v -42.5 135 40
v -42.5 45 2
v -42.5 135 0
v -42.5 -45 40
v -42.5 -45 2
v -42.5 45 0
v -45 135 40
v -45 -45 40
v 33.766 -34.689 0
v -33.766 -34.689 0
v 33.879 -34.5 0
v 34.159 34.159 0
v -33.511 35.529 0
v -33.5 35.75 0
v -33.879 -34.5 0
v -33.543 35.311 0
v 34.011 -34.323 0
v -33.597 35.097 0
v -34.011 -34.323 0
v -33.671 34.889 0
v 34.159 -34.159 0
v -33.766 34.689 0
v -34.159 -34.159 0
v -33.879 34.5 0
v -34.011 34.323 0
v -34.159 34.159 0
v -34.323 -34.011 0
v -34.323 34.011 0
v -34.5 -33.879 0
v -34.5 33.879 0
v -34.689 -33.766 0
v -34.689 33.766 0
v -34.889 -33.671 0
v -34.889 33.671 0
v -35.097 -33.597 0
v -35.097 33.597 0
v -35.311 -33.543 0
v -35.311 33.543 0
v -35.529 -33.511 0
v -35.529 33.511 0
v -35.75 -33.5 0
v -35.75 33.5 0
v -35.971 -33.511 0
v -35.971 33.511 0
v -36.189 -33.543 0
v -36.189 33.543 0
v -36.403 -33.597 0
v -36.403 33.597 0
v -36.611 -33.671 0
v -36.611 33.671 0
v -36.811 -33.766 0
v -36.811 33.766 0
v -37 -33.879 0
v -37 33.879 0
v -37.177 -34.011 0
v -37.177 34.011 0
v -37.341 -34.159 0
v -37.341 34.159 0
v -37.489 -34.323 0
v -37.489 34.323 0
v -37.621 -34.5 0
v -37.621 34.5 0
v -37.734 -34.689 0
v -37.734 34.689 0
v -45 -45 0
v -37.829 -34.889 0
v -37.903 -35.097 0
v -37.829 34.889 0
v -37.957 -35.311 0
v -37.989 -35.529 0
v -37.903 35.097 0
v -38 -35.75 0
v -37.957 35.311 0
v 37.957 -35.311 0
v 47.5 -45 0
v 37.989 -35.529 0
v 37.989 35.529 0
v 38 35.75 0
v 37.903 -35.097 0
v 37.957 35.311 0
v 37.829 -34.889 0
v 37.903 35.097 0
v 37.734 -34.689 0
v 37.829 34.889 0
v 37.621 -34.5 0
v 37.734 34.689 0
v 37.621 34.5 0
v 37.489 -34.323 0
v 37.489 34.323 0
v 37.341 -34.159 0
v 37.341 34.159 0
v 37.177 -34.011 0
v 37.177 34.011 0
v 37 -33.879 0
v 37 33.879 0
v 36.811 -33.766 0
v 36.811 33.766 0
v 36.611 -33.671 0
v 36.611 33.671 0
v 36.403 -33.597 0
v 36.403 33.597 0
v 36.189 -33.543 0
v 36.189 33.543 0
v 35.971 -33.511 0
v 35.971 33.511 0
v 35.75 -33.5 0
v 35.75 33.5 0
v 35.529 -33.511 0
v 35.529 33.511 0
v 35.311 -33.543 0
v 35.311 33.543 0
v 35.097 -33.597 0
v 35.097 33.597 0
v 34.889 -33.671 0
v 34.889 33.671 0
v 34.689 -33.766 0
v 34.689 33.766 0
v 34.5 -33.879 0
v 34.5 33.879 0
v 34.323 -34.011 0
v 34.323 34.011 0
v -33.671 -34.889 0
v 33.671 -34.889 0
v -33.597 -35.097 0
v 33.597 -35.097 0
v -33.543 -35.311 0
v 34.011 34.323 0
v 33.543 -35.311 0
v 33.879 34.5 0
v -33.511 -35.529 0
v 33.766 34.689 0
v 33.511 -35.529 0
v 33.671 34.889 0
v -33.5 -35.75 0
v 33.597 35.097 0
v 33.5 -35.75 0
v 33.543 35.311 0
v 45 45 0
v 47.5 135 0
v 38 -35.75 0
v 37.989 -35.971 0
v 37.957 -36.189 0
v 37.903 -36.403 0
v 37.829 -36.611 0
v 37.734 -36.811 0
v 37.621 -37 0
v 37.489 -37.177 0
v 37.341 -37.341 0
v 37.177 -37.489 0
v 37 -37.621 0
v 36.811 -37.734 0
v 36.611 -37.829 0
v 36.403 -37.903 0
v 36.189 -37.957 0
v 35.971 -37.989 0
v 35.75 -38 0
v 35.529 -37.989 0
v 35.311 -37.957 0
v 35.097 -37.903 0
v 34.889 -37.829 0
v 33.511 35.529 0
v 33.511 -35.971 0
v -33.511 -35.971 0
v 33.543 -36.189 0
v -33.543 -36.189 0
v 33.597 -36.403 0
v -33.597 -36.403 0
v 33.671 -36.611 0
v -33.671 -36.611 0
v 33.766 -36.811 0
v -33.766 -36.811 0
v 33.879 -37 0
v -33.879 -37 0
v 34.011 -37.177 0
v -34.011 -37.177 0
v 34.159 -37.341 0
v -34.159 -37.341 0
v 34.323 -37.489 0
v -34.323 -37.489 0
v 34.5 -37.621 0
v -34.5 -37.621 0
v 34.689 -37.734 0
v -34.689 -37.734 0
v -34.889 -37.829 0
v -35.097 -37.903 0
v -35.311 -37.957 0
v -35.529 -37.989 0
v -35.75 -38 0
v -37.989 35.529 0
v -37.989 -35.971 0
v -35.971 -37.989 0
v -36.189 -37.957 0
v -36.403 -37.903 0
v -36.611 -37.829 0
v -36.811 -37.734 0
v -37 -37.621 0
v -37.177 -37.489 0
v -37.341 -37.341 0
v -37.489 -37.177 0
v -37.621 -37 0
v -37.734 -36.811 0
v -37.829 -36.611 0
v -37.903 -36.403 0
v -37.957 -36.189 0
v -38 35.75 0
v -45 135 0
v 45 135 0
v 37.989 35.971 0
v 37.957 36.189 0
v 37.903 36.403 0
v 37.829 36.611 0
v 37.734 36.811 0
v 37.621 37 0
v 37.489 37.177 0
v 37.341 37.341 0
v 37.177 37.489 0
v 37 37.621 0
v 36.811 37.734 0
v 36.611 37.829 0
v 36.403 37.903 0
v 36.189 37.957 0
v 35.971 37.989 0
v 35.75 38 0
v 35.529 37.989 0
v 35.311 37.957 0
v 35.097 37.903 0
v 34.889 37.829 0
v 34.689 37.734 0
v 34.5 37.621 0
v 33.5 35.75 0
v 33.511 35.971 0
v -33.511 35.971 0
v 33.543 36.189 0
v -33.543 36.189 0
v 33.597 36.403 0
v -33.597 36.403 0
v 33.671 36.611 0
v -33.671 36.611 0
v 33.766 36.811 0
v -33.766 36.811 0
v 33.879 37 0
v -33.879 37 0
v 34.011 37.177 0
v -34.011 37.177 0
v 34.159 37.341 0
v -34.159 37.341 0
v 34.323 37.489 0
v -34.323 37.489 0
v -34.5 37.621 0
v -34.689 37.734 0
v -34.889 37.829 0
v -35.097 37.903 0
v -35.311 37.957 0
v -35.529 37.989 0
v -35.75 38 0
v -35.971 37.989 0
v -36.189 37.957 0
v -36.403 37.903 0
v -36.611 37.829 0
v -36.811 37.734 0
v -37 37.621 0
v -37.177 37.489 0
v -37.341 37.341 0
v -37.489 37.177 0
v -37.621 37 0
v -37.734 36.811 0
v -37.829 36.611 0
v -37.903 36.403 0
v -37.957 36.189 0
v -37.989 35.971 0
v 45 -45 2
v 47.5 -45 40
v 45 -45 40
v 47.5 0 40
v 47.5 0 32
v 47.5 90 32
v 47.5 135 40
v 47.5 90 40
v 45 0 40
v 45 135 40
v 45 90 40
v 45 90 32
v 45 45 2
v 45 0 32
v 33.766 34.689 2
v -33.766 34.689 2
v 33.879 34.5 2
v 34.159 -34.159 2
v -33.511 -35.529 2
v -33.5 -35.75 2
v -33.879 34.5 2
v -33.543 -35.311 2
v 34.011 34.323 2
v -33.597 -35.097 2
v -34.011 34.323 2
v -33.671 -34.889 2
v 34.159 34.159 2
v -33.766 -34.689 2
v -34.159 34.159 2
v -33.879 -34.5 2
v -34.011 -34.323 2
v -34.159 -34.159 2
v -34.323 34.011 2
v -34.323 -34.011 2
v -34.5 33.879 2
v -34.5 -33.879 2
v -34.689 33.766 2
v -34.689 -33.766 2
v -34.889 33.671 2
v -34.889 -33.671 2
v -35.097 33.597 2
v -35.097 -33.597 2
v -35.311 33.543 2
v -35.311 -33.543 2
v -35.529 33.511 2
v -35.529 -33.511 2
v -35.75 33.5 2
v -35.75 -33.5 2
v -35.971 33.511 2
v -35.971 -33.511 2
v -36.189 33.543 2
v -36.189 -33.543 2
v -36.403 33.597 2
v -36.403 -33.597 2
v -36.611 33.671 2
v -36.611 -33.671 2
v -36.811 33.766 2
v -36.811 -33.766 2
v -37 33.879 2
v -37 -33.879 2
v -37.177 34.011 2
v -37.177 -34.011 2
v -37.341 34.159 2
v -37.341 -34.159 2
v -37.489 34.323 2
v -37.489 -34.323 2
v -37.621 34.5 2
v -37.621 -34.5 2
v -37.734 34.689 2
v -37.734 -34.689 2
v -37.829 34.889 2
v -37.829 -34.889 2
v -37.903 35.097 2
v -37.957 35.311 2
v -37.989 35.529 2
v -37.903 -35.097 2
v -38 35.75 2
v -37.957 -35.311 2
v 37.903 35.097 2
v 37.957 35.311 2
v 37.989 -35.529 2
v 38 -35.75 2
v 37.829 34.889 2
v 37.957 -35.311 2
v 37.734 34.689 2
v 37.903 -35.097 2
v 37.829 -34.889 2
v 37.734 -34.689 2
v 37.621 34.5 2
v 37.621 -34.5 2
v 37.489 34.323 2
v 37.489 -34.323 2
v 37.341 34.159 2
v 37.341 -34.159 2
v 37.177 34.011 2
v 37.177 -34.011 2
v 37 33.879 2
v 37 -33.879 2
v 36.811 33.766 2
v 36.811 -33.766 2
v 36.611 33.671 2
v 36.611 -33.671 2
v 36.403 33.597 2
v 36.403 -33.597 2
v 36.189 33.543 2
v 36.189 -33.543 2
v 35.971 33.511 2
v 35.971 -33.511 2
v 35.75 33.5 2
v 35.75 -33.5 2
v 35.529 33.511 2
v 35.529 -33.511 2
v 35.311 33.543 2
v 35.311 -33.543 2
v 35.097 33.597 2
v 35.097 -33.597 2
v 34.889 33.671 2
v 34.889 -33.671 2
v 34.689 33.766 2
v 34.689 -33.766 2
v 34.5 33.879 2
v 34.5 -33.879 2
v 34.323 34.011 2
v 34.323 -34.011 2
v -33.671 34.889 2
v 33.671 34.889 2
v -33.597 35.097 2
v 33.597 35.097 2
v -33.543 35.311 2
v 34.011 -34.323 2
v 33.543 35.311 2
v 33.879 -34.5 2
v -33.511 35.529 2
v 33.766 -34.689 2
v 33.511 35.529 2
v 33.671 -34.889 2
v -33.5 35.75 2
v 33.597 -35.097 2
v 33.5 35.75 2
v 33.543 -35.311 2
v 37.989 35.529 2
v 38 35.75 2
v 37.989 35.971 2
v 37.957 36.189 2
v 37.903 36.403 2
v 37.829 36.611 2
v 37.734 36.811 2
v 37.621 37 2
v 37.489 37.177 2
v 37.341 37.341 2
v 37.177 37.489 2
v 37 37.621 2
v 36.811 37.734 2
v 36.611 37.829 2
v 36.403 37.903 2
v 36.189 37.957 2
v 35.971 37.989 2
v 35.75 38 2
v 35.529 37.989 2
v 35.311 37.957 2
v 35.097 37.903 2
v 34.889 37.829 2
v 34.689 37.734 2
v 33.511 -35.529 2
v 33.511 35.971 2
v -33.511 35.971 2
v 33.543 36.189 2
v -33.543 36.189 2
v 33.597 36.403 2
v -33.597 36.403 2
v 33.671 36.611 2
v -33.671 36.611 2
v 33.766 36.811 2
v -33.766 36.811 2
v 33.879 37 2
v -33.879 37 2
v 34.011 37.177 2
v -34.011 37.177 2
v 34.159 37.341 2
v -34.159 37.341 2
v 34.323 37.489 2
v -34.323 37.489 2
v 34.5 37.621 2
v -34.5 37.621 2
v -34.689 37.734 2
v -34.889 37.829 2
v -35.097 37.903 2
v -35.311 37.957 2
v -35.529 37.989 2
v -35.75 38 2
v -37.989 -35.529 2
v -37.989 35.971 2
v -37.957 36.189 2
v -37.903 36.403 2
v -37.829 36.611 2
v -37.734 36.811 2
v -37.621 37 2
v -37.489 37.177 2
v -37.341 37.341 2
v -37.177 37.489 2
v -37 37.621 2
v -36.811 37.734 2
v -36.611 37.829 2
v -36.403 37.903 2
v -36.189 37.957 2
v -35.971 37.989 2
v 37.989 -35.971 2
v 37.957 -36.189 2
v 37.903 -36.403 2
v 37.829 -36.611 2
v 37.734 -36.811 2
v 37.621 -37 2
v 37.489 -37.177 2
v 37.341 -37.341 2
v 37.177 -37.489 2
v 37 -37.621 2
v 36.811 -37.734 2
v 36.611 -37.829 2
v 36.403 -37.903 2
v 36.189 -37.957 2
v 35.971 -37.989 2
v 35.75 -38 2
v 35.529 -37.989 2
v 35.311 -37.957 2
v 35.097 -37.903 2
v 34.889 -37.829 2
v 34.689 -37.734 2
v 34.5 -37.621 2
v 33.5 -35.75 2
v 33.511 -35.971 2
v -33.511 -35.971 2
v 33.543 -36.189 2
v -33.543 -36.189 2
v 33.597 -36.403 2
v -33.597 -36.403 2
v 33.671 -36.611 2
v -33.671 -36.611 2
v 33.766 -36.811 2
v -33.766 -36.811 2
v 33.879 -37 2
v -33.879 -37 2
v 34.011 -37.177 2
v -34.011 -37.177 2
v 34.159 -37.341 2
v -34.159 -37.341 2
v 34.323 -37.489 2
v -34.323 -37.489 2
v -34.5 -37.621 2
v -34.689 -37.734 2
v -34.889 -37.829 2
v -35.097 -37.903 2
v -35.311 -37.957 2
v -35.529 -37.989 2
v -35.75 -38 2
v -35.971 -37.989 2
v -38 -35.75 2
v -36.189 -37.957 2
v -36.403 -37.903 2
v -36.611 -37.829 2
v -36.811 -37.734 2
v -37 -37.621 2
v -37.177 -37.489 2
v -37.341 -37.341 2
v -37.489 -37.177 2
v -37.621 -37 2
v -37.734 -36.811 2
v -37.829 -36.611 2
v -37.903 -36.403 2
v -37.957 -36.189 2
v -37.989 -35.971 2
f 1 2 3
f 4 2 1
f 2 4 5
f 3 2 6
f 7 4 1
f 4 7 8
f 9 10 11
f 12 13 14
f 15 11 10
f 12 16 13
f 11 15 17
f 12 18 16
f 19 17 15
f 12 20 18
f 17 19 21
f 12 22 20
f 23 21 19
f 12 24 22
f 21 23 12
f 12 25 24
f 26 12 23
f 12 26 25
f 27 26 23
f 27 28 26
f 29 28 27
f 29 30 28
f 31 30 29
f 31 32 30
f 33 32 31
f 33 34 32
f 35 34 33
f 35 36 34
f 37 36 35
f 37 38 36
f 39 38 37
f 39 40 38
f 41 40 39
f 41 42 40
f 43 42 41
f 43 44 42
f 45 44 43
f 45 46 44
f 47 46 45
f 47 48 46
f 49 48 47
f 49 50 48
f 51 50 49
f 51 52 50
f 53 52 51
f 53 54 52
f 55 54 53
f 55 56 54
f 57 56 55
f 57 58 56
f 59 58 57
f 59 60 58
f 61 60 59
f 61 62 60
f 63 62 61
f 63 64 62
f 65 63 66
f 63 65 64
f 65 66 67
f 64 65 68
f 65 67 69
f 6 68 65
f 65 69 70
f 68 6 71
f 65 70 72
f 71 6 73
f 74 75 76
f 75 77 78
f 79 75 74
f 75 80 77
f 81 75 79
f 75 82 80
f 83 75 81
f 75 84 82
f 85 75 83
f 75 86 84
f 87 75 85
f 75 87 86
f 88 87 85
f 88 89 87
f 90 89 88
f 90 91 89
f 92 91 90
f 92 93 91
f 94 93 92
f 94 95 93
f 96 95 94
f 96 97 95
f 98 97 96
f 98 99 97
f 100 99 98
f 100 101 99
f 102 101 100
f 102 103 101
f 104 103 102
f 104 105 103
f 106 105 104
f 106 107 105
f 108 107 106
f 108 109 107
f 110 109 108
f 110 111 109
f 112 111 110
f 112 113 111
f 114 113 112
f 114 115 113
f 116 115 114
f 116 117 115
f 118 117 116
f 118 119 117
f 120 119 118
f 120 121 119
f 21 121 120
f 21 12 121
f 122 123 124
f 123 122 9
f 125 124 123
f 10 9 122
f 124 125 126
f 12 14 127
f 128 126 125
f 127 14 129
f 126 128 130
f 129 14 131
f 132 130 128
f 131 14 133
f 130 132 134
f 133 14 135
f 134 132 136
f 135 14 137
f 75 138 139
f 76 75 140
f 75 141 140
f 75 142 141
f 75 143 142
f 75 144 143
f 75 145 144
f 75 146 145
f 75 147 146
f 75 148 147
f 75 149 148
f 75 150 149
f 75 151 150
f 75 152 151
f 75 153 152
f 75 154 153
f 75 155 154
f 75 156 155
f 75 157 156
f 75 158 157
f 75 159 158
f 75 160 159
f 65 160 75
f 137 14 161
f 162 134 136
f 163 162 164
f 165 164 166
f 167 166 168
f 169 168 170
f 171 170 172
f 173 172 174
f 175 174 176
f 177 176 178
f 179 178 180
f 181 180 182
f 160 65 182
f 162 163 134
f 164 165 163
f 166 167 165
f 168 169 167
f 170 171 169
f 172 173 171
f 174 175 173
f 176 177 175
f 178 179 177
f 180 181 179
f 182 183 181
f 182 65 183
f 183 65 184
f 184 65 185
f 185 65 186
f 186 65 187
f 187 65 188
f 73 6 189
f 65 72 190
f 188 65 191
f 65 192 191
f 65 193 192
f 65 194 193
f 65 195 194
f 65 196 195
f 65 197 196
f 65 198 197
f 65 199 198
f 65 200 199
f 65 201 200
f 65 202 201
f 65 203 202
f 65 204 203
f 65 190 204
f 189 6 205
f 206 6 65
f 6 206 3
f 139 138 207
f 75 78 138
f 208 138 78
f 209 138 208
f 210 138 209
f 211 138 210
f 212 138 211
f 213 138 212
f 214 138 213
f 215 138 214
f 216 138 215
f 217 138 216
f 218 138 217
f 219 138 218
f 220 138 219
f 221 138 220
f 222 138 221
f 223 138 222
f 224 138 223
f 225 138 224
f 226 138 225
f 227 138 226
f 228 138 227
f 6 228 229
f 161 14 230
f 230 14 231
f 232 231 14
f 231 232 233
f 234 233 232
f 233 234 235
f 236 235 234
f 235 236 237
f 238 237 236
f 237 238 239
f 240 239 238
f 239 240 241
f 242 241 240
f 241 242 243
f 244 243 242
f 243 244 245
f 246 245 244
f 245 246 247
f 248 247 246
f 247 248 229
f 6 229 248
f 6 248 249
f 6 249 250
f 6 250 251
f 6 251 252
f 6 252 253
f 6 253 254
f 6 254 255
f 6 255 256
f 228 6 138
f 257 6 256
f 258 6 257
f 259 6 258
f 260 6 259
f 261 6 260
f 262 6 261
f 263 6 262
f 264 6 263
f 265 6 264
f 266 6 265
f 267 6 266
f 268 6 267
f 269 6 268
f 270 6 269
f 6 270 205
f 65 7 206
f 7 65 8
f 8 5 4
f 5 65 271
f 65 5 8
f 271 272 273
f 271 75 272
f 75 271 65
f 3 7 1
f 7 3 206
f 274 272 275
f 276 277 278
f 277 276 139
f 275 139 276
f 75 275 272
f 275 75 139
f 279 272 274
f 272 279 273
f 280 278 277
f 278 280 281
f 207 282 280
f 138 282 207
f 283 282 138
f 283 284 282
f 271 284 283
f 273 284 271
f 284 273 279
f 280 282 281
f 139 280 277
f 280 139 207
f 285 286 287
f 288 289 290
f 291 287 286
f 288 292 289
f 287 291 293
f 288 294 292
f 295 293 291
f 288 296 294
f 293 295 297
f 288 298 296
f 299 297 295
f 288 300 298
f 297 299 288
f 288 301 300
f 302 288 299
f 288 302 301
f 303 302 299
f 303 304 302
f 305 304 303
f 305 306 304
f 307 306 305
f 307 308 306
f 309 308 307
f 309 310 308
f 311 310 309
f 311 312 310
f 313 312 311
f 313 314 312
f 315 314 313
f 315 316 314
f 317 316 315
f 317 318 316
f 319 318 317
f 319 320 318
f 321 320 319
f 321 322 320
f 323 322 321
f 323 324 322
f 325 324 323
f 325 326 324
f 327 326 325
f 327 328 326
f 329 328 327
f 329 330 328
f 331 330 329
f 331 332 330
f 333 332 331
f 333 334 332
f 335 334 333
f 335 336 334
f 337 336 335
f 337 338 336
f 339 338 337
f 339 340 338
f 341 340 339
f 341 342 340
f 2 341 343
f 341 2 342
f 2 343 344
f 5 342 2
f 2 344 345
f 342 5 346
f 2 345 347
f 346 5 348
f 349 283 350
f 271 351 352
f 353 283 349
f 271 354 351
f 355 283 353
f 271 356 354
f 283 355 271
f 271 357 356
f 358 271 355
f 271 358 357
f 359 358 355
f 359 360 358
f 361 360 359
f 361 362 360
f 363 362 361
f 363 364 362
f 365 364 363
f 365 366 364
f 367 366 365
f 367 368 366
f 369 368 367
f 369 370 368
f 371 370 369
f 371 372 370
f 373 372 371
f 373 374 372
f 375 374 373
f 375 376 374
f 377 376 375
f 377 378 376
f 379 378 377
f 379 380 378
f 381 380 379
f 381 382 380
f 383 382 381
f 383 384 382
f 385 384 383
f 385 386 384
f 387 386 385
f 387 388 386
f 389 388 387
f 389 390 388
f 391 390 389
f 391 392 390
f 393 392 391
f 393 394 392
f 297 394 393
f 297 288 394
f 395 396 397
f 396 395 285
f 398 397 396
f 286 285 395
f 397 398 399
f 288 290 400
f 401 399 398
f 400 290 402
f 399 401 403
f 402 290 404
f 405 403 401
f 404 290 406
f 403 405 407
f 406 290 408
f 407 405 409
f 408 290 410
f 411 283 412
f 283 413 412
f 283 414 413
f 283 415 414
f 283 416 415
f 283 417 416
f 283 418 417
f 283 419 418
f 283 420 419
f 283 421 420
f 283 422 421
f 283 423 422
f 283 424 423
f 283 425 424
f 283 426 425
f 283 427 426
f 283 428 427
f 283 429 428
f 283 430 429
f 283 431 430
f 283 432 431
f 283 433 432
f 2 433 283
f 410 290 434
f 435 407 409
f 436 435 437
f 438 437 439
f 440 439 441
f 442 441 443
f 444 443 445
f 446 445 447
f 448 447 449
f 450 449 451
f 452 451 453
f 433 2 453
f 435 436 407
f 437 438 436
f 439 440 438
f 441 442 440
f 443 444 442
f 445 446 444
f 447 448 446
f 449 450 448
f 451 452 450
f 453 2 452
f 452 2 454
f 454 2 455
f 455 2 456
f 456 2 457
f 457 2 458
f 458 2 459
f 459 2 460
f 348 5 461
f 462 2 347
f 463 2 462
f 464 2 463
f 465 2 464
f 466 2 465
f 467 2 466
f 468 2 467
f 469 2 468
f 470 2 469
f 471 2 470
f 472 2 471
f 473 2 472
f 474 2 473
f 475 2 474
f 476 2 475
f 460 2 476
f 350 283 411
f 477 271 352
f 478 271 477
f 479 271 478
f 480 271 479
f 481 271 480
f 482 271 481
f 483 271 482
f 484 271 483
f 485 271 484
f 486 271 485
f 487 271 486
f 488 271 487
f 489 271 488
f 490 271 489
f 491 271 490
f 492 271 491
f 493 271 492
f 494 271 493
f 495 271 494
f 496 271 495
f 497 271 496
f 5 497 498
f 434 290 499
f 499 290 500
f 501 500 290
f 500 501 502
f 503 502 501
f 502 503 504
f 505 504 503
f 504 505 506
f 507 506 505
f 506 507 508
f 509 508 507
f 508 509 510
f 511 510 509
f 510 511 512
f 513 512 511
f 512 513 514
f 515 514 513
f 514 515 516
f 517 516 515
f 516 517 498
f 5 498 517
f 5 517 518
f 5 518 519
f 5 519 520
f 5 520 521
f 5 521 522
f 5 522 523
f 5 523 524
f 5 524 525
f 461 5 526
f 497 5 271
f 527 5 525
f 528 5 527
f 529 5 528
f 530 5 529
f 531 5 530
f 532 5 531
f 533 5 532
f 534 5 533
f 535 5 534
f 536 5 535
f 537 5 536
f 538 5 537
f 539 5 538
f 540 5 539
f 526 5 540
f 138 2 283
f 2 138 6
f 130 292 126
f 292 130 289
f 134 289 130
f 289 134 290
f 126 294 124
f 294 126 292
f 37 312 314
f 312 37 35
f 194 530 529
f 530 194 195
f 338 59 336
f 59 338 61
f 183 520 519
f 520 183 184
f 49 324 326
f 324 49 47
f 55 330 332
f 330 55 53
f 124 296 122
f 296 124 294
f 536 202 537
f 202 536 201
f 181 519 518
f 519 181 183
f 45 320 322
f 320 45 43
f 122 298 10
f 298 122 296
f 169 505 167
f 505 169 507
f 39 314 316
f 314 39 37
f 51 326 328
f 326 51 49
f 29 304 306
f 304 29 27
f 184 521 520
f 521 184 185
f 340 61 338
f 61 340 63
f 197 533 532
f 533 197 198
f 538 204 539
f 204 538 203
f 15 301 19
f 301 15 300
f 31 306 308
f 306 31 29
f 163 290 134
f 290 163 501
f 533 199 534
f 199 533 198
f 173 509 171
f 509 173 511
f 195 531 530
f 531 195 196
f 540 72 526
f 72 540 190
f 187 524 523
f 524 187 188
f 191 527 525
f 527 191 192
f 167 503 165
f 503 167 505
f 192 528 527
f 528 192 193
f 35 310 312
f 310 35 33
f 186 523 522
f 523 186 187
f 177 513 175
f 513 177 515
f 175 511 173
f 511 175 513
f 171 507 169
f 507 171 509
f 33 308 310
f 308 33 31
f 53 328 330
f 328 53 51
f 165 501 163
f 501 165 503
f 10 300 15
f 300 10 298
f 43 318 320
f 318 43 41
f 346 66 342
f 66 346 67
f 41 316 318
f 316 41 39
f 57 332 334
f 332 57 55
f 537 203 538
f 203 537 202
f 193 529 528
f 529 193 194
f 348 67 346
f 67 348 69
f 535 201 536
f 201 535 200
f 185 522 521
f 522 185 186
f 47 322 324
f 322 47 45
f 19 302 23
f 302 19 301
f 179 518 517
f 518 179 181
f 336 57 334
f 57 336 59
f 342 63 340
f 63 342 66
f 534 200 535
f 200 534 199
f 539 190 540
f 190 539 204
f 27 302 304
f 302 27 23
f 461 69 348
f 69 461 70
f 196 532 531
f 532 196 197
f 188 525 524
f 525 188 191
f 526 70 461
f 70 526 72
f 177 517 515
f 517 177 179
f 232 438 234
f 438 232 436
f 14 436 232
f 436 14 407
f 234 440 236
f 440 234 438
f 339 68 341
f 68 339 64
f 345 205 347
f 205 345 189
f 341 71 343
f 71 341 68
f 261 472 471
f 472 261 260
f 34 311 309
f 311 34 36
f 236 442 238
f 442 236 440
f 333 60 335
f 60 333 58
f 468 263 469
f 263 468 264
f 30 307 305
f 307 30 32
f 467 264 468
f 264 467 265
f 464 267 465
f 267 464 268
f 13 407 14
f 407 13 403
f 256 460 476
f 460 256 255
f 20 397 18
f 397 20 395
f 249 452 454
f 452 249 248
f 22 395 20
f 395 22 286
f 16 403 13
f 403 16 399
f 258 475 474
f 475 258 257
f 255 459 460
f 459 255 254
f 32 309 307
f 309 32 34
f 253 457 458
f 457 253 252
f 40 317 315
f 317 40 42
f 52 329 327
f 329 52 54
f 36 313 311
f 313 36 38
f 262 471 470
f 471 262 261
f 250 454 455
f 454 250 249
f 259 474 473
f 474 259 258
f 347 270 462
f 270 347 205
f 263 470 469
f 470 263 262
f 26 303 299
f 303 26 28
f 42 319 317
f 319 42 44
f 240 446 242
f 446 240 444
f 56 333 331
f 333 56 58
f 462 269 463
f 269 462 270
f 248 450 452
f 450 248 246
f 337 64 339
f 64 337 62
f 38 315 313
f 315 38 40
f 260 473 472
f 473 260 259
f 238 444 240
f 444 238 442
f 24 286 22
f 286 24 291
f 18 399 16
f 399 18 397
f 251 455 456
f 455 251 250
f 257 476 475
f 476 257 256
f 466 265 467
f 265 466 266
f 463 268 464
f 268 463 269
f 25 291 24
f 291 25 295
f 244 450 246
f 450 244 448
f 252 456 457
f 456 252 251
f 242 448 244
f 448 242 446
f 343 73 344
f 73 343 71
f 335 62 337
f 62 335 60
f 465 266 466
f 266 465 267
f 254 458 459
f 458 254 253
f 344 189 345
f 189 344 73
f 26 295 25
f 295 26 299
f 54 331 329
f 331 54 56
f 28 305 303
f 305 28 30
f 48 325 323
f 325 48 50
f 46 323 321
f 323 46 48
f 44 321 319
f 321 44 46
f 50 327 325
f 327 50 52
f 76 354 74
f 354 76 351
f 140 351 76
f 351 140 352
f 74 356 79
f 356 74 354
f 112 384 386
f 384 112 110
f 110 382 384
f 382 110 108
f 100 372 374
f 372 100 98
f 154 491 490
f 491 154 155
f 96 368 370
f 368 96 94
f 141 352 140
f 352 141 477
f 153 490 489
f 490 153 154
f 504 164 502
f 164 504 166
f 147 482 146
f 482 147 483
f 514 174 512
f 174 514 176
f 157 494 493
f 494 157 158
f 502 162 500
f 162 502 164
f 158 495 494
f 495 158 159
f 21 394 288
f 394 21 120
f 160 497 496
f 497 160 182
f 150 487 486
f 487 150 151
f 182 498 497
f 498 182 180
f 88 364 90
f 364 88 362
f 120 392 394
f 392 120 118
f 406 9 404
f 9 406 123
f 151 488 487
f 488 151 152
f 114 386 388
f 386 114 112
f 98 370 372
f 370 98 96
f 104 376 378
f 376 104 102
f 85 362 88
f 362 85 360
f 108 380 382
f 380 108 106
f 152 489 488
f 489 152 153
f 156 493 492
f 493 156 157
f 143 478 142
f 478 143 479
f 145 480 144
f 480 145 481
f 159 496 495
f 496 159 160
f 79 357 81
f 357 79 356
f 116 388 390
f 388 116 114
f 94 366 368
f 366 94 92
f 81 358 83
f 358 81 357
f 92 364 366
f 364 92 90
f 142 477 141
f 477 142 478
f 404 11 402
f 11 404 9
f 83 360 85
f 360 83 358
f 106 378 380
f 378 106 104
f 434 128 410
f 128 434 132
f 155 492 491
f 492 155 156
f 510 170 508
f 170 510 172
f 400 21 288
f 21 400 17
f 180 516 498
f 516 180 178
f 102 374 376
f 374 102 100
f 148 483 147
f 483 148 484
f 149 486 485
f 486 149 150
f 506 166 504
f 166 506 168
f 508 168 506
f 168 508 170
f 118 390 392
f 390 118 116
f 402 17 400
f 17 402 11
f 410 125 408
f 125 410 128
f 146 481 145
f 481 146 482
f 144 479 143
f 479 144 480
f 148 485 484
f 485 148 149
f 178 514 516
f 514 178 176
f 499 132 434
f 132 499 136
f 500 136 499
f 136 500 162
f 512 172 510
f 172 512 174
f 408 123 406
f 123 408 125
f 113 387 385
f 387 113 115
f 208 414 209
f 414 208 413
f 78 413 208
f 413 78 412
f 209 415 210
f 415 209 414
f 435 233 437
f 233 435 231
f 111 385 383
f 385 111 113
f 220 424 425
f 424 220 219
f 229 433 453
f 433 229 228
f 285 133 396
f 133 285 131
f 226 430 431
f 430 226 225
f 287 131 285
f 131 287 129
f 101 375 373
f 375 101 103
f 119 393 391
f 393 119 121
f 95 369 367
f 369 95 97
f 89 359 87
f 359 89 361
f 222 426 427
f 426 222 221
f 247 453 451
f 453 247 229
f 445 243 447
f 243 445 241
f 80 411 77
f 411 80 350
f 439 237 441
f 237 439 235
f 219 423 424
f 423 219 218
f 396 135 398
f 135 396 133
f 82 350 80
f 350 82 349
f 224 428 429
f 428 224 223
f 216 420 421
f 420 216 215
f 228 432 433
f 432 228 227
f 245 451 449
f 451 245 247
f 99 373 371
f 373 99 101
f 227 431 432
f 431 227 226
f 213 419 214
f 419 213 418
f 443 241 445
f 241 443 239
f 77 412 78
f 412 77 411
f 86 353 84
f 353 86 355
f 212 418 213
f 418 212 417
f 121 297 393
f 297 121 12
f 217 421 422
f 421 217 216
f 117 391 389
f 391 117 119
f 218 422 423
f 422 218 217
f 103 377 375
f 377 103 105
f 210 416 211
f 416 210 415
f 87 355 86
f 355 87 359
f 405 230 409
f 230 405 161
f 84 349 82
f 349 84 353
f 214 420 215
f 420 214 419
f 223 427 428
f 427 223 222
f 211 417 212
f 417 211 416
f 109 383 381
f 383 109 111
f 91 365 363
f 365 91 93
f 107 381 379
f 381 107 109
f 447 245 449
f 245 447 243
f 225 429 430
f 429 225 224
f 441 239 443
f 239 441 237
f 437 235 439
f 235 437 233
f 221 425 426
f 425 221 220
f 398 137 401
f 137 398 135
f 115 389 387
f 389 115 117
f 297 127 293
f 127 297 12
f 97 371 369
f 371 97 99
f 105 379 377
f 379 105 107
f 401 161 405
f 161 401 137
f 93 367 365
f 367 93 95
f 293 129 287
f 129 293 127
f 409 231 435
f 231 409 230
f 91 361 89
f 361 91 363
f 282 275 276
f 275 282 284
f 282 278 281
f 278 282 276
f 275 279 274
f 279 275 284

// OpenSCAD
// Housing for a DIY magnetic stirrer built from an 80 mm PC case fan
// Printed upside down: top plate on the bed, box open at the top.

$fn = 64;

// ---- Dimensions (mm) ----
fan_outer      = 80;    // fan outer size (reference)
housing_outer  = 90;    // housing outer size (X x Y)
top_thick      = 2;     // top plate thickness (z = 0 to 2)
wall_thick     = 2.5;   // wall thickness
box_height     = 40;    // total height of box walls (open top at z = 40)
screw_pitch    = 71.5;  // square pitch of M4 screw holes
screw_d        = 4.5;   // M4 screw hole diameter
cable_w        = 12;    // cable notch width
cable_reach    = 8;     // notch depth from open edge (z = 32 to 40)

eps            = 0.5;   // cutter overshoot past faces

difference() {
    union() {
        // Top plate
        translate([-housing_outer/2, -housing_outer/2, 0])
            cube([housing_outer, housing_outer, top_thick]);
        // Four walls
        for (x = [-1, 1])
            for (y = [-1, 1])
                translate([x*housing_outer/2, y*housing_outer/2, 0])
                    cube([wall_thick, housing_outer, box_height]);
    }

    // M4 screw holes through top plate
    for (x = [-1, 1])
        for (y = [-1, 1])
            translate([x*screw_pitch/2, y*screw_pitch/2, -eps])
                cylinder(d = screw_d, h = top_thick + 2*eps);

    // Cable notch in one wall (X+ wall), centred along the wall
    translate([housing_outer/2, 0, box_height - cable_reach])
        cube([cable_w, housing_outer, cable_reach + eps]);
}
